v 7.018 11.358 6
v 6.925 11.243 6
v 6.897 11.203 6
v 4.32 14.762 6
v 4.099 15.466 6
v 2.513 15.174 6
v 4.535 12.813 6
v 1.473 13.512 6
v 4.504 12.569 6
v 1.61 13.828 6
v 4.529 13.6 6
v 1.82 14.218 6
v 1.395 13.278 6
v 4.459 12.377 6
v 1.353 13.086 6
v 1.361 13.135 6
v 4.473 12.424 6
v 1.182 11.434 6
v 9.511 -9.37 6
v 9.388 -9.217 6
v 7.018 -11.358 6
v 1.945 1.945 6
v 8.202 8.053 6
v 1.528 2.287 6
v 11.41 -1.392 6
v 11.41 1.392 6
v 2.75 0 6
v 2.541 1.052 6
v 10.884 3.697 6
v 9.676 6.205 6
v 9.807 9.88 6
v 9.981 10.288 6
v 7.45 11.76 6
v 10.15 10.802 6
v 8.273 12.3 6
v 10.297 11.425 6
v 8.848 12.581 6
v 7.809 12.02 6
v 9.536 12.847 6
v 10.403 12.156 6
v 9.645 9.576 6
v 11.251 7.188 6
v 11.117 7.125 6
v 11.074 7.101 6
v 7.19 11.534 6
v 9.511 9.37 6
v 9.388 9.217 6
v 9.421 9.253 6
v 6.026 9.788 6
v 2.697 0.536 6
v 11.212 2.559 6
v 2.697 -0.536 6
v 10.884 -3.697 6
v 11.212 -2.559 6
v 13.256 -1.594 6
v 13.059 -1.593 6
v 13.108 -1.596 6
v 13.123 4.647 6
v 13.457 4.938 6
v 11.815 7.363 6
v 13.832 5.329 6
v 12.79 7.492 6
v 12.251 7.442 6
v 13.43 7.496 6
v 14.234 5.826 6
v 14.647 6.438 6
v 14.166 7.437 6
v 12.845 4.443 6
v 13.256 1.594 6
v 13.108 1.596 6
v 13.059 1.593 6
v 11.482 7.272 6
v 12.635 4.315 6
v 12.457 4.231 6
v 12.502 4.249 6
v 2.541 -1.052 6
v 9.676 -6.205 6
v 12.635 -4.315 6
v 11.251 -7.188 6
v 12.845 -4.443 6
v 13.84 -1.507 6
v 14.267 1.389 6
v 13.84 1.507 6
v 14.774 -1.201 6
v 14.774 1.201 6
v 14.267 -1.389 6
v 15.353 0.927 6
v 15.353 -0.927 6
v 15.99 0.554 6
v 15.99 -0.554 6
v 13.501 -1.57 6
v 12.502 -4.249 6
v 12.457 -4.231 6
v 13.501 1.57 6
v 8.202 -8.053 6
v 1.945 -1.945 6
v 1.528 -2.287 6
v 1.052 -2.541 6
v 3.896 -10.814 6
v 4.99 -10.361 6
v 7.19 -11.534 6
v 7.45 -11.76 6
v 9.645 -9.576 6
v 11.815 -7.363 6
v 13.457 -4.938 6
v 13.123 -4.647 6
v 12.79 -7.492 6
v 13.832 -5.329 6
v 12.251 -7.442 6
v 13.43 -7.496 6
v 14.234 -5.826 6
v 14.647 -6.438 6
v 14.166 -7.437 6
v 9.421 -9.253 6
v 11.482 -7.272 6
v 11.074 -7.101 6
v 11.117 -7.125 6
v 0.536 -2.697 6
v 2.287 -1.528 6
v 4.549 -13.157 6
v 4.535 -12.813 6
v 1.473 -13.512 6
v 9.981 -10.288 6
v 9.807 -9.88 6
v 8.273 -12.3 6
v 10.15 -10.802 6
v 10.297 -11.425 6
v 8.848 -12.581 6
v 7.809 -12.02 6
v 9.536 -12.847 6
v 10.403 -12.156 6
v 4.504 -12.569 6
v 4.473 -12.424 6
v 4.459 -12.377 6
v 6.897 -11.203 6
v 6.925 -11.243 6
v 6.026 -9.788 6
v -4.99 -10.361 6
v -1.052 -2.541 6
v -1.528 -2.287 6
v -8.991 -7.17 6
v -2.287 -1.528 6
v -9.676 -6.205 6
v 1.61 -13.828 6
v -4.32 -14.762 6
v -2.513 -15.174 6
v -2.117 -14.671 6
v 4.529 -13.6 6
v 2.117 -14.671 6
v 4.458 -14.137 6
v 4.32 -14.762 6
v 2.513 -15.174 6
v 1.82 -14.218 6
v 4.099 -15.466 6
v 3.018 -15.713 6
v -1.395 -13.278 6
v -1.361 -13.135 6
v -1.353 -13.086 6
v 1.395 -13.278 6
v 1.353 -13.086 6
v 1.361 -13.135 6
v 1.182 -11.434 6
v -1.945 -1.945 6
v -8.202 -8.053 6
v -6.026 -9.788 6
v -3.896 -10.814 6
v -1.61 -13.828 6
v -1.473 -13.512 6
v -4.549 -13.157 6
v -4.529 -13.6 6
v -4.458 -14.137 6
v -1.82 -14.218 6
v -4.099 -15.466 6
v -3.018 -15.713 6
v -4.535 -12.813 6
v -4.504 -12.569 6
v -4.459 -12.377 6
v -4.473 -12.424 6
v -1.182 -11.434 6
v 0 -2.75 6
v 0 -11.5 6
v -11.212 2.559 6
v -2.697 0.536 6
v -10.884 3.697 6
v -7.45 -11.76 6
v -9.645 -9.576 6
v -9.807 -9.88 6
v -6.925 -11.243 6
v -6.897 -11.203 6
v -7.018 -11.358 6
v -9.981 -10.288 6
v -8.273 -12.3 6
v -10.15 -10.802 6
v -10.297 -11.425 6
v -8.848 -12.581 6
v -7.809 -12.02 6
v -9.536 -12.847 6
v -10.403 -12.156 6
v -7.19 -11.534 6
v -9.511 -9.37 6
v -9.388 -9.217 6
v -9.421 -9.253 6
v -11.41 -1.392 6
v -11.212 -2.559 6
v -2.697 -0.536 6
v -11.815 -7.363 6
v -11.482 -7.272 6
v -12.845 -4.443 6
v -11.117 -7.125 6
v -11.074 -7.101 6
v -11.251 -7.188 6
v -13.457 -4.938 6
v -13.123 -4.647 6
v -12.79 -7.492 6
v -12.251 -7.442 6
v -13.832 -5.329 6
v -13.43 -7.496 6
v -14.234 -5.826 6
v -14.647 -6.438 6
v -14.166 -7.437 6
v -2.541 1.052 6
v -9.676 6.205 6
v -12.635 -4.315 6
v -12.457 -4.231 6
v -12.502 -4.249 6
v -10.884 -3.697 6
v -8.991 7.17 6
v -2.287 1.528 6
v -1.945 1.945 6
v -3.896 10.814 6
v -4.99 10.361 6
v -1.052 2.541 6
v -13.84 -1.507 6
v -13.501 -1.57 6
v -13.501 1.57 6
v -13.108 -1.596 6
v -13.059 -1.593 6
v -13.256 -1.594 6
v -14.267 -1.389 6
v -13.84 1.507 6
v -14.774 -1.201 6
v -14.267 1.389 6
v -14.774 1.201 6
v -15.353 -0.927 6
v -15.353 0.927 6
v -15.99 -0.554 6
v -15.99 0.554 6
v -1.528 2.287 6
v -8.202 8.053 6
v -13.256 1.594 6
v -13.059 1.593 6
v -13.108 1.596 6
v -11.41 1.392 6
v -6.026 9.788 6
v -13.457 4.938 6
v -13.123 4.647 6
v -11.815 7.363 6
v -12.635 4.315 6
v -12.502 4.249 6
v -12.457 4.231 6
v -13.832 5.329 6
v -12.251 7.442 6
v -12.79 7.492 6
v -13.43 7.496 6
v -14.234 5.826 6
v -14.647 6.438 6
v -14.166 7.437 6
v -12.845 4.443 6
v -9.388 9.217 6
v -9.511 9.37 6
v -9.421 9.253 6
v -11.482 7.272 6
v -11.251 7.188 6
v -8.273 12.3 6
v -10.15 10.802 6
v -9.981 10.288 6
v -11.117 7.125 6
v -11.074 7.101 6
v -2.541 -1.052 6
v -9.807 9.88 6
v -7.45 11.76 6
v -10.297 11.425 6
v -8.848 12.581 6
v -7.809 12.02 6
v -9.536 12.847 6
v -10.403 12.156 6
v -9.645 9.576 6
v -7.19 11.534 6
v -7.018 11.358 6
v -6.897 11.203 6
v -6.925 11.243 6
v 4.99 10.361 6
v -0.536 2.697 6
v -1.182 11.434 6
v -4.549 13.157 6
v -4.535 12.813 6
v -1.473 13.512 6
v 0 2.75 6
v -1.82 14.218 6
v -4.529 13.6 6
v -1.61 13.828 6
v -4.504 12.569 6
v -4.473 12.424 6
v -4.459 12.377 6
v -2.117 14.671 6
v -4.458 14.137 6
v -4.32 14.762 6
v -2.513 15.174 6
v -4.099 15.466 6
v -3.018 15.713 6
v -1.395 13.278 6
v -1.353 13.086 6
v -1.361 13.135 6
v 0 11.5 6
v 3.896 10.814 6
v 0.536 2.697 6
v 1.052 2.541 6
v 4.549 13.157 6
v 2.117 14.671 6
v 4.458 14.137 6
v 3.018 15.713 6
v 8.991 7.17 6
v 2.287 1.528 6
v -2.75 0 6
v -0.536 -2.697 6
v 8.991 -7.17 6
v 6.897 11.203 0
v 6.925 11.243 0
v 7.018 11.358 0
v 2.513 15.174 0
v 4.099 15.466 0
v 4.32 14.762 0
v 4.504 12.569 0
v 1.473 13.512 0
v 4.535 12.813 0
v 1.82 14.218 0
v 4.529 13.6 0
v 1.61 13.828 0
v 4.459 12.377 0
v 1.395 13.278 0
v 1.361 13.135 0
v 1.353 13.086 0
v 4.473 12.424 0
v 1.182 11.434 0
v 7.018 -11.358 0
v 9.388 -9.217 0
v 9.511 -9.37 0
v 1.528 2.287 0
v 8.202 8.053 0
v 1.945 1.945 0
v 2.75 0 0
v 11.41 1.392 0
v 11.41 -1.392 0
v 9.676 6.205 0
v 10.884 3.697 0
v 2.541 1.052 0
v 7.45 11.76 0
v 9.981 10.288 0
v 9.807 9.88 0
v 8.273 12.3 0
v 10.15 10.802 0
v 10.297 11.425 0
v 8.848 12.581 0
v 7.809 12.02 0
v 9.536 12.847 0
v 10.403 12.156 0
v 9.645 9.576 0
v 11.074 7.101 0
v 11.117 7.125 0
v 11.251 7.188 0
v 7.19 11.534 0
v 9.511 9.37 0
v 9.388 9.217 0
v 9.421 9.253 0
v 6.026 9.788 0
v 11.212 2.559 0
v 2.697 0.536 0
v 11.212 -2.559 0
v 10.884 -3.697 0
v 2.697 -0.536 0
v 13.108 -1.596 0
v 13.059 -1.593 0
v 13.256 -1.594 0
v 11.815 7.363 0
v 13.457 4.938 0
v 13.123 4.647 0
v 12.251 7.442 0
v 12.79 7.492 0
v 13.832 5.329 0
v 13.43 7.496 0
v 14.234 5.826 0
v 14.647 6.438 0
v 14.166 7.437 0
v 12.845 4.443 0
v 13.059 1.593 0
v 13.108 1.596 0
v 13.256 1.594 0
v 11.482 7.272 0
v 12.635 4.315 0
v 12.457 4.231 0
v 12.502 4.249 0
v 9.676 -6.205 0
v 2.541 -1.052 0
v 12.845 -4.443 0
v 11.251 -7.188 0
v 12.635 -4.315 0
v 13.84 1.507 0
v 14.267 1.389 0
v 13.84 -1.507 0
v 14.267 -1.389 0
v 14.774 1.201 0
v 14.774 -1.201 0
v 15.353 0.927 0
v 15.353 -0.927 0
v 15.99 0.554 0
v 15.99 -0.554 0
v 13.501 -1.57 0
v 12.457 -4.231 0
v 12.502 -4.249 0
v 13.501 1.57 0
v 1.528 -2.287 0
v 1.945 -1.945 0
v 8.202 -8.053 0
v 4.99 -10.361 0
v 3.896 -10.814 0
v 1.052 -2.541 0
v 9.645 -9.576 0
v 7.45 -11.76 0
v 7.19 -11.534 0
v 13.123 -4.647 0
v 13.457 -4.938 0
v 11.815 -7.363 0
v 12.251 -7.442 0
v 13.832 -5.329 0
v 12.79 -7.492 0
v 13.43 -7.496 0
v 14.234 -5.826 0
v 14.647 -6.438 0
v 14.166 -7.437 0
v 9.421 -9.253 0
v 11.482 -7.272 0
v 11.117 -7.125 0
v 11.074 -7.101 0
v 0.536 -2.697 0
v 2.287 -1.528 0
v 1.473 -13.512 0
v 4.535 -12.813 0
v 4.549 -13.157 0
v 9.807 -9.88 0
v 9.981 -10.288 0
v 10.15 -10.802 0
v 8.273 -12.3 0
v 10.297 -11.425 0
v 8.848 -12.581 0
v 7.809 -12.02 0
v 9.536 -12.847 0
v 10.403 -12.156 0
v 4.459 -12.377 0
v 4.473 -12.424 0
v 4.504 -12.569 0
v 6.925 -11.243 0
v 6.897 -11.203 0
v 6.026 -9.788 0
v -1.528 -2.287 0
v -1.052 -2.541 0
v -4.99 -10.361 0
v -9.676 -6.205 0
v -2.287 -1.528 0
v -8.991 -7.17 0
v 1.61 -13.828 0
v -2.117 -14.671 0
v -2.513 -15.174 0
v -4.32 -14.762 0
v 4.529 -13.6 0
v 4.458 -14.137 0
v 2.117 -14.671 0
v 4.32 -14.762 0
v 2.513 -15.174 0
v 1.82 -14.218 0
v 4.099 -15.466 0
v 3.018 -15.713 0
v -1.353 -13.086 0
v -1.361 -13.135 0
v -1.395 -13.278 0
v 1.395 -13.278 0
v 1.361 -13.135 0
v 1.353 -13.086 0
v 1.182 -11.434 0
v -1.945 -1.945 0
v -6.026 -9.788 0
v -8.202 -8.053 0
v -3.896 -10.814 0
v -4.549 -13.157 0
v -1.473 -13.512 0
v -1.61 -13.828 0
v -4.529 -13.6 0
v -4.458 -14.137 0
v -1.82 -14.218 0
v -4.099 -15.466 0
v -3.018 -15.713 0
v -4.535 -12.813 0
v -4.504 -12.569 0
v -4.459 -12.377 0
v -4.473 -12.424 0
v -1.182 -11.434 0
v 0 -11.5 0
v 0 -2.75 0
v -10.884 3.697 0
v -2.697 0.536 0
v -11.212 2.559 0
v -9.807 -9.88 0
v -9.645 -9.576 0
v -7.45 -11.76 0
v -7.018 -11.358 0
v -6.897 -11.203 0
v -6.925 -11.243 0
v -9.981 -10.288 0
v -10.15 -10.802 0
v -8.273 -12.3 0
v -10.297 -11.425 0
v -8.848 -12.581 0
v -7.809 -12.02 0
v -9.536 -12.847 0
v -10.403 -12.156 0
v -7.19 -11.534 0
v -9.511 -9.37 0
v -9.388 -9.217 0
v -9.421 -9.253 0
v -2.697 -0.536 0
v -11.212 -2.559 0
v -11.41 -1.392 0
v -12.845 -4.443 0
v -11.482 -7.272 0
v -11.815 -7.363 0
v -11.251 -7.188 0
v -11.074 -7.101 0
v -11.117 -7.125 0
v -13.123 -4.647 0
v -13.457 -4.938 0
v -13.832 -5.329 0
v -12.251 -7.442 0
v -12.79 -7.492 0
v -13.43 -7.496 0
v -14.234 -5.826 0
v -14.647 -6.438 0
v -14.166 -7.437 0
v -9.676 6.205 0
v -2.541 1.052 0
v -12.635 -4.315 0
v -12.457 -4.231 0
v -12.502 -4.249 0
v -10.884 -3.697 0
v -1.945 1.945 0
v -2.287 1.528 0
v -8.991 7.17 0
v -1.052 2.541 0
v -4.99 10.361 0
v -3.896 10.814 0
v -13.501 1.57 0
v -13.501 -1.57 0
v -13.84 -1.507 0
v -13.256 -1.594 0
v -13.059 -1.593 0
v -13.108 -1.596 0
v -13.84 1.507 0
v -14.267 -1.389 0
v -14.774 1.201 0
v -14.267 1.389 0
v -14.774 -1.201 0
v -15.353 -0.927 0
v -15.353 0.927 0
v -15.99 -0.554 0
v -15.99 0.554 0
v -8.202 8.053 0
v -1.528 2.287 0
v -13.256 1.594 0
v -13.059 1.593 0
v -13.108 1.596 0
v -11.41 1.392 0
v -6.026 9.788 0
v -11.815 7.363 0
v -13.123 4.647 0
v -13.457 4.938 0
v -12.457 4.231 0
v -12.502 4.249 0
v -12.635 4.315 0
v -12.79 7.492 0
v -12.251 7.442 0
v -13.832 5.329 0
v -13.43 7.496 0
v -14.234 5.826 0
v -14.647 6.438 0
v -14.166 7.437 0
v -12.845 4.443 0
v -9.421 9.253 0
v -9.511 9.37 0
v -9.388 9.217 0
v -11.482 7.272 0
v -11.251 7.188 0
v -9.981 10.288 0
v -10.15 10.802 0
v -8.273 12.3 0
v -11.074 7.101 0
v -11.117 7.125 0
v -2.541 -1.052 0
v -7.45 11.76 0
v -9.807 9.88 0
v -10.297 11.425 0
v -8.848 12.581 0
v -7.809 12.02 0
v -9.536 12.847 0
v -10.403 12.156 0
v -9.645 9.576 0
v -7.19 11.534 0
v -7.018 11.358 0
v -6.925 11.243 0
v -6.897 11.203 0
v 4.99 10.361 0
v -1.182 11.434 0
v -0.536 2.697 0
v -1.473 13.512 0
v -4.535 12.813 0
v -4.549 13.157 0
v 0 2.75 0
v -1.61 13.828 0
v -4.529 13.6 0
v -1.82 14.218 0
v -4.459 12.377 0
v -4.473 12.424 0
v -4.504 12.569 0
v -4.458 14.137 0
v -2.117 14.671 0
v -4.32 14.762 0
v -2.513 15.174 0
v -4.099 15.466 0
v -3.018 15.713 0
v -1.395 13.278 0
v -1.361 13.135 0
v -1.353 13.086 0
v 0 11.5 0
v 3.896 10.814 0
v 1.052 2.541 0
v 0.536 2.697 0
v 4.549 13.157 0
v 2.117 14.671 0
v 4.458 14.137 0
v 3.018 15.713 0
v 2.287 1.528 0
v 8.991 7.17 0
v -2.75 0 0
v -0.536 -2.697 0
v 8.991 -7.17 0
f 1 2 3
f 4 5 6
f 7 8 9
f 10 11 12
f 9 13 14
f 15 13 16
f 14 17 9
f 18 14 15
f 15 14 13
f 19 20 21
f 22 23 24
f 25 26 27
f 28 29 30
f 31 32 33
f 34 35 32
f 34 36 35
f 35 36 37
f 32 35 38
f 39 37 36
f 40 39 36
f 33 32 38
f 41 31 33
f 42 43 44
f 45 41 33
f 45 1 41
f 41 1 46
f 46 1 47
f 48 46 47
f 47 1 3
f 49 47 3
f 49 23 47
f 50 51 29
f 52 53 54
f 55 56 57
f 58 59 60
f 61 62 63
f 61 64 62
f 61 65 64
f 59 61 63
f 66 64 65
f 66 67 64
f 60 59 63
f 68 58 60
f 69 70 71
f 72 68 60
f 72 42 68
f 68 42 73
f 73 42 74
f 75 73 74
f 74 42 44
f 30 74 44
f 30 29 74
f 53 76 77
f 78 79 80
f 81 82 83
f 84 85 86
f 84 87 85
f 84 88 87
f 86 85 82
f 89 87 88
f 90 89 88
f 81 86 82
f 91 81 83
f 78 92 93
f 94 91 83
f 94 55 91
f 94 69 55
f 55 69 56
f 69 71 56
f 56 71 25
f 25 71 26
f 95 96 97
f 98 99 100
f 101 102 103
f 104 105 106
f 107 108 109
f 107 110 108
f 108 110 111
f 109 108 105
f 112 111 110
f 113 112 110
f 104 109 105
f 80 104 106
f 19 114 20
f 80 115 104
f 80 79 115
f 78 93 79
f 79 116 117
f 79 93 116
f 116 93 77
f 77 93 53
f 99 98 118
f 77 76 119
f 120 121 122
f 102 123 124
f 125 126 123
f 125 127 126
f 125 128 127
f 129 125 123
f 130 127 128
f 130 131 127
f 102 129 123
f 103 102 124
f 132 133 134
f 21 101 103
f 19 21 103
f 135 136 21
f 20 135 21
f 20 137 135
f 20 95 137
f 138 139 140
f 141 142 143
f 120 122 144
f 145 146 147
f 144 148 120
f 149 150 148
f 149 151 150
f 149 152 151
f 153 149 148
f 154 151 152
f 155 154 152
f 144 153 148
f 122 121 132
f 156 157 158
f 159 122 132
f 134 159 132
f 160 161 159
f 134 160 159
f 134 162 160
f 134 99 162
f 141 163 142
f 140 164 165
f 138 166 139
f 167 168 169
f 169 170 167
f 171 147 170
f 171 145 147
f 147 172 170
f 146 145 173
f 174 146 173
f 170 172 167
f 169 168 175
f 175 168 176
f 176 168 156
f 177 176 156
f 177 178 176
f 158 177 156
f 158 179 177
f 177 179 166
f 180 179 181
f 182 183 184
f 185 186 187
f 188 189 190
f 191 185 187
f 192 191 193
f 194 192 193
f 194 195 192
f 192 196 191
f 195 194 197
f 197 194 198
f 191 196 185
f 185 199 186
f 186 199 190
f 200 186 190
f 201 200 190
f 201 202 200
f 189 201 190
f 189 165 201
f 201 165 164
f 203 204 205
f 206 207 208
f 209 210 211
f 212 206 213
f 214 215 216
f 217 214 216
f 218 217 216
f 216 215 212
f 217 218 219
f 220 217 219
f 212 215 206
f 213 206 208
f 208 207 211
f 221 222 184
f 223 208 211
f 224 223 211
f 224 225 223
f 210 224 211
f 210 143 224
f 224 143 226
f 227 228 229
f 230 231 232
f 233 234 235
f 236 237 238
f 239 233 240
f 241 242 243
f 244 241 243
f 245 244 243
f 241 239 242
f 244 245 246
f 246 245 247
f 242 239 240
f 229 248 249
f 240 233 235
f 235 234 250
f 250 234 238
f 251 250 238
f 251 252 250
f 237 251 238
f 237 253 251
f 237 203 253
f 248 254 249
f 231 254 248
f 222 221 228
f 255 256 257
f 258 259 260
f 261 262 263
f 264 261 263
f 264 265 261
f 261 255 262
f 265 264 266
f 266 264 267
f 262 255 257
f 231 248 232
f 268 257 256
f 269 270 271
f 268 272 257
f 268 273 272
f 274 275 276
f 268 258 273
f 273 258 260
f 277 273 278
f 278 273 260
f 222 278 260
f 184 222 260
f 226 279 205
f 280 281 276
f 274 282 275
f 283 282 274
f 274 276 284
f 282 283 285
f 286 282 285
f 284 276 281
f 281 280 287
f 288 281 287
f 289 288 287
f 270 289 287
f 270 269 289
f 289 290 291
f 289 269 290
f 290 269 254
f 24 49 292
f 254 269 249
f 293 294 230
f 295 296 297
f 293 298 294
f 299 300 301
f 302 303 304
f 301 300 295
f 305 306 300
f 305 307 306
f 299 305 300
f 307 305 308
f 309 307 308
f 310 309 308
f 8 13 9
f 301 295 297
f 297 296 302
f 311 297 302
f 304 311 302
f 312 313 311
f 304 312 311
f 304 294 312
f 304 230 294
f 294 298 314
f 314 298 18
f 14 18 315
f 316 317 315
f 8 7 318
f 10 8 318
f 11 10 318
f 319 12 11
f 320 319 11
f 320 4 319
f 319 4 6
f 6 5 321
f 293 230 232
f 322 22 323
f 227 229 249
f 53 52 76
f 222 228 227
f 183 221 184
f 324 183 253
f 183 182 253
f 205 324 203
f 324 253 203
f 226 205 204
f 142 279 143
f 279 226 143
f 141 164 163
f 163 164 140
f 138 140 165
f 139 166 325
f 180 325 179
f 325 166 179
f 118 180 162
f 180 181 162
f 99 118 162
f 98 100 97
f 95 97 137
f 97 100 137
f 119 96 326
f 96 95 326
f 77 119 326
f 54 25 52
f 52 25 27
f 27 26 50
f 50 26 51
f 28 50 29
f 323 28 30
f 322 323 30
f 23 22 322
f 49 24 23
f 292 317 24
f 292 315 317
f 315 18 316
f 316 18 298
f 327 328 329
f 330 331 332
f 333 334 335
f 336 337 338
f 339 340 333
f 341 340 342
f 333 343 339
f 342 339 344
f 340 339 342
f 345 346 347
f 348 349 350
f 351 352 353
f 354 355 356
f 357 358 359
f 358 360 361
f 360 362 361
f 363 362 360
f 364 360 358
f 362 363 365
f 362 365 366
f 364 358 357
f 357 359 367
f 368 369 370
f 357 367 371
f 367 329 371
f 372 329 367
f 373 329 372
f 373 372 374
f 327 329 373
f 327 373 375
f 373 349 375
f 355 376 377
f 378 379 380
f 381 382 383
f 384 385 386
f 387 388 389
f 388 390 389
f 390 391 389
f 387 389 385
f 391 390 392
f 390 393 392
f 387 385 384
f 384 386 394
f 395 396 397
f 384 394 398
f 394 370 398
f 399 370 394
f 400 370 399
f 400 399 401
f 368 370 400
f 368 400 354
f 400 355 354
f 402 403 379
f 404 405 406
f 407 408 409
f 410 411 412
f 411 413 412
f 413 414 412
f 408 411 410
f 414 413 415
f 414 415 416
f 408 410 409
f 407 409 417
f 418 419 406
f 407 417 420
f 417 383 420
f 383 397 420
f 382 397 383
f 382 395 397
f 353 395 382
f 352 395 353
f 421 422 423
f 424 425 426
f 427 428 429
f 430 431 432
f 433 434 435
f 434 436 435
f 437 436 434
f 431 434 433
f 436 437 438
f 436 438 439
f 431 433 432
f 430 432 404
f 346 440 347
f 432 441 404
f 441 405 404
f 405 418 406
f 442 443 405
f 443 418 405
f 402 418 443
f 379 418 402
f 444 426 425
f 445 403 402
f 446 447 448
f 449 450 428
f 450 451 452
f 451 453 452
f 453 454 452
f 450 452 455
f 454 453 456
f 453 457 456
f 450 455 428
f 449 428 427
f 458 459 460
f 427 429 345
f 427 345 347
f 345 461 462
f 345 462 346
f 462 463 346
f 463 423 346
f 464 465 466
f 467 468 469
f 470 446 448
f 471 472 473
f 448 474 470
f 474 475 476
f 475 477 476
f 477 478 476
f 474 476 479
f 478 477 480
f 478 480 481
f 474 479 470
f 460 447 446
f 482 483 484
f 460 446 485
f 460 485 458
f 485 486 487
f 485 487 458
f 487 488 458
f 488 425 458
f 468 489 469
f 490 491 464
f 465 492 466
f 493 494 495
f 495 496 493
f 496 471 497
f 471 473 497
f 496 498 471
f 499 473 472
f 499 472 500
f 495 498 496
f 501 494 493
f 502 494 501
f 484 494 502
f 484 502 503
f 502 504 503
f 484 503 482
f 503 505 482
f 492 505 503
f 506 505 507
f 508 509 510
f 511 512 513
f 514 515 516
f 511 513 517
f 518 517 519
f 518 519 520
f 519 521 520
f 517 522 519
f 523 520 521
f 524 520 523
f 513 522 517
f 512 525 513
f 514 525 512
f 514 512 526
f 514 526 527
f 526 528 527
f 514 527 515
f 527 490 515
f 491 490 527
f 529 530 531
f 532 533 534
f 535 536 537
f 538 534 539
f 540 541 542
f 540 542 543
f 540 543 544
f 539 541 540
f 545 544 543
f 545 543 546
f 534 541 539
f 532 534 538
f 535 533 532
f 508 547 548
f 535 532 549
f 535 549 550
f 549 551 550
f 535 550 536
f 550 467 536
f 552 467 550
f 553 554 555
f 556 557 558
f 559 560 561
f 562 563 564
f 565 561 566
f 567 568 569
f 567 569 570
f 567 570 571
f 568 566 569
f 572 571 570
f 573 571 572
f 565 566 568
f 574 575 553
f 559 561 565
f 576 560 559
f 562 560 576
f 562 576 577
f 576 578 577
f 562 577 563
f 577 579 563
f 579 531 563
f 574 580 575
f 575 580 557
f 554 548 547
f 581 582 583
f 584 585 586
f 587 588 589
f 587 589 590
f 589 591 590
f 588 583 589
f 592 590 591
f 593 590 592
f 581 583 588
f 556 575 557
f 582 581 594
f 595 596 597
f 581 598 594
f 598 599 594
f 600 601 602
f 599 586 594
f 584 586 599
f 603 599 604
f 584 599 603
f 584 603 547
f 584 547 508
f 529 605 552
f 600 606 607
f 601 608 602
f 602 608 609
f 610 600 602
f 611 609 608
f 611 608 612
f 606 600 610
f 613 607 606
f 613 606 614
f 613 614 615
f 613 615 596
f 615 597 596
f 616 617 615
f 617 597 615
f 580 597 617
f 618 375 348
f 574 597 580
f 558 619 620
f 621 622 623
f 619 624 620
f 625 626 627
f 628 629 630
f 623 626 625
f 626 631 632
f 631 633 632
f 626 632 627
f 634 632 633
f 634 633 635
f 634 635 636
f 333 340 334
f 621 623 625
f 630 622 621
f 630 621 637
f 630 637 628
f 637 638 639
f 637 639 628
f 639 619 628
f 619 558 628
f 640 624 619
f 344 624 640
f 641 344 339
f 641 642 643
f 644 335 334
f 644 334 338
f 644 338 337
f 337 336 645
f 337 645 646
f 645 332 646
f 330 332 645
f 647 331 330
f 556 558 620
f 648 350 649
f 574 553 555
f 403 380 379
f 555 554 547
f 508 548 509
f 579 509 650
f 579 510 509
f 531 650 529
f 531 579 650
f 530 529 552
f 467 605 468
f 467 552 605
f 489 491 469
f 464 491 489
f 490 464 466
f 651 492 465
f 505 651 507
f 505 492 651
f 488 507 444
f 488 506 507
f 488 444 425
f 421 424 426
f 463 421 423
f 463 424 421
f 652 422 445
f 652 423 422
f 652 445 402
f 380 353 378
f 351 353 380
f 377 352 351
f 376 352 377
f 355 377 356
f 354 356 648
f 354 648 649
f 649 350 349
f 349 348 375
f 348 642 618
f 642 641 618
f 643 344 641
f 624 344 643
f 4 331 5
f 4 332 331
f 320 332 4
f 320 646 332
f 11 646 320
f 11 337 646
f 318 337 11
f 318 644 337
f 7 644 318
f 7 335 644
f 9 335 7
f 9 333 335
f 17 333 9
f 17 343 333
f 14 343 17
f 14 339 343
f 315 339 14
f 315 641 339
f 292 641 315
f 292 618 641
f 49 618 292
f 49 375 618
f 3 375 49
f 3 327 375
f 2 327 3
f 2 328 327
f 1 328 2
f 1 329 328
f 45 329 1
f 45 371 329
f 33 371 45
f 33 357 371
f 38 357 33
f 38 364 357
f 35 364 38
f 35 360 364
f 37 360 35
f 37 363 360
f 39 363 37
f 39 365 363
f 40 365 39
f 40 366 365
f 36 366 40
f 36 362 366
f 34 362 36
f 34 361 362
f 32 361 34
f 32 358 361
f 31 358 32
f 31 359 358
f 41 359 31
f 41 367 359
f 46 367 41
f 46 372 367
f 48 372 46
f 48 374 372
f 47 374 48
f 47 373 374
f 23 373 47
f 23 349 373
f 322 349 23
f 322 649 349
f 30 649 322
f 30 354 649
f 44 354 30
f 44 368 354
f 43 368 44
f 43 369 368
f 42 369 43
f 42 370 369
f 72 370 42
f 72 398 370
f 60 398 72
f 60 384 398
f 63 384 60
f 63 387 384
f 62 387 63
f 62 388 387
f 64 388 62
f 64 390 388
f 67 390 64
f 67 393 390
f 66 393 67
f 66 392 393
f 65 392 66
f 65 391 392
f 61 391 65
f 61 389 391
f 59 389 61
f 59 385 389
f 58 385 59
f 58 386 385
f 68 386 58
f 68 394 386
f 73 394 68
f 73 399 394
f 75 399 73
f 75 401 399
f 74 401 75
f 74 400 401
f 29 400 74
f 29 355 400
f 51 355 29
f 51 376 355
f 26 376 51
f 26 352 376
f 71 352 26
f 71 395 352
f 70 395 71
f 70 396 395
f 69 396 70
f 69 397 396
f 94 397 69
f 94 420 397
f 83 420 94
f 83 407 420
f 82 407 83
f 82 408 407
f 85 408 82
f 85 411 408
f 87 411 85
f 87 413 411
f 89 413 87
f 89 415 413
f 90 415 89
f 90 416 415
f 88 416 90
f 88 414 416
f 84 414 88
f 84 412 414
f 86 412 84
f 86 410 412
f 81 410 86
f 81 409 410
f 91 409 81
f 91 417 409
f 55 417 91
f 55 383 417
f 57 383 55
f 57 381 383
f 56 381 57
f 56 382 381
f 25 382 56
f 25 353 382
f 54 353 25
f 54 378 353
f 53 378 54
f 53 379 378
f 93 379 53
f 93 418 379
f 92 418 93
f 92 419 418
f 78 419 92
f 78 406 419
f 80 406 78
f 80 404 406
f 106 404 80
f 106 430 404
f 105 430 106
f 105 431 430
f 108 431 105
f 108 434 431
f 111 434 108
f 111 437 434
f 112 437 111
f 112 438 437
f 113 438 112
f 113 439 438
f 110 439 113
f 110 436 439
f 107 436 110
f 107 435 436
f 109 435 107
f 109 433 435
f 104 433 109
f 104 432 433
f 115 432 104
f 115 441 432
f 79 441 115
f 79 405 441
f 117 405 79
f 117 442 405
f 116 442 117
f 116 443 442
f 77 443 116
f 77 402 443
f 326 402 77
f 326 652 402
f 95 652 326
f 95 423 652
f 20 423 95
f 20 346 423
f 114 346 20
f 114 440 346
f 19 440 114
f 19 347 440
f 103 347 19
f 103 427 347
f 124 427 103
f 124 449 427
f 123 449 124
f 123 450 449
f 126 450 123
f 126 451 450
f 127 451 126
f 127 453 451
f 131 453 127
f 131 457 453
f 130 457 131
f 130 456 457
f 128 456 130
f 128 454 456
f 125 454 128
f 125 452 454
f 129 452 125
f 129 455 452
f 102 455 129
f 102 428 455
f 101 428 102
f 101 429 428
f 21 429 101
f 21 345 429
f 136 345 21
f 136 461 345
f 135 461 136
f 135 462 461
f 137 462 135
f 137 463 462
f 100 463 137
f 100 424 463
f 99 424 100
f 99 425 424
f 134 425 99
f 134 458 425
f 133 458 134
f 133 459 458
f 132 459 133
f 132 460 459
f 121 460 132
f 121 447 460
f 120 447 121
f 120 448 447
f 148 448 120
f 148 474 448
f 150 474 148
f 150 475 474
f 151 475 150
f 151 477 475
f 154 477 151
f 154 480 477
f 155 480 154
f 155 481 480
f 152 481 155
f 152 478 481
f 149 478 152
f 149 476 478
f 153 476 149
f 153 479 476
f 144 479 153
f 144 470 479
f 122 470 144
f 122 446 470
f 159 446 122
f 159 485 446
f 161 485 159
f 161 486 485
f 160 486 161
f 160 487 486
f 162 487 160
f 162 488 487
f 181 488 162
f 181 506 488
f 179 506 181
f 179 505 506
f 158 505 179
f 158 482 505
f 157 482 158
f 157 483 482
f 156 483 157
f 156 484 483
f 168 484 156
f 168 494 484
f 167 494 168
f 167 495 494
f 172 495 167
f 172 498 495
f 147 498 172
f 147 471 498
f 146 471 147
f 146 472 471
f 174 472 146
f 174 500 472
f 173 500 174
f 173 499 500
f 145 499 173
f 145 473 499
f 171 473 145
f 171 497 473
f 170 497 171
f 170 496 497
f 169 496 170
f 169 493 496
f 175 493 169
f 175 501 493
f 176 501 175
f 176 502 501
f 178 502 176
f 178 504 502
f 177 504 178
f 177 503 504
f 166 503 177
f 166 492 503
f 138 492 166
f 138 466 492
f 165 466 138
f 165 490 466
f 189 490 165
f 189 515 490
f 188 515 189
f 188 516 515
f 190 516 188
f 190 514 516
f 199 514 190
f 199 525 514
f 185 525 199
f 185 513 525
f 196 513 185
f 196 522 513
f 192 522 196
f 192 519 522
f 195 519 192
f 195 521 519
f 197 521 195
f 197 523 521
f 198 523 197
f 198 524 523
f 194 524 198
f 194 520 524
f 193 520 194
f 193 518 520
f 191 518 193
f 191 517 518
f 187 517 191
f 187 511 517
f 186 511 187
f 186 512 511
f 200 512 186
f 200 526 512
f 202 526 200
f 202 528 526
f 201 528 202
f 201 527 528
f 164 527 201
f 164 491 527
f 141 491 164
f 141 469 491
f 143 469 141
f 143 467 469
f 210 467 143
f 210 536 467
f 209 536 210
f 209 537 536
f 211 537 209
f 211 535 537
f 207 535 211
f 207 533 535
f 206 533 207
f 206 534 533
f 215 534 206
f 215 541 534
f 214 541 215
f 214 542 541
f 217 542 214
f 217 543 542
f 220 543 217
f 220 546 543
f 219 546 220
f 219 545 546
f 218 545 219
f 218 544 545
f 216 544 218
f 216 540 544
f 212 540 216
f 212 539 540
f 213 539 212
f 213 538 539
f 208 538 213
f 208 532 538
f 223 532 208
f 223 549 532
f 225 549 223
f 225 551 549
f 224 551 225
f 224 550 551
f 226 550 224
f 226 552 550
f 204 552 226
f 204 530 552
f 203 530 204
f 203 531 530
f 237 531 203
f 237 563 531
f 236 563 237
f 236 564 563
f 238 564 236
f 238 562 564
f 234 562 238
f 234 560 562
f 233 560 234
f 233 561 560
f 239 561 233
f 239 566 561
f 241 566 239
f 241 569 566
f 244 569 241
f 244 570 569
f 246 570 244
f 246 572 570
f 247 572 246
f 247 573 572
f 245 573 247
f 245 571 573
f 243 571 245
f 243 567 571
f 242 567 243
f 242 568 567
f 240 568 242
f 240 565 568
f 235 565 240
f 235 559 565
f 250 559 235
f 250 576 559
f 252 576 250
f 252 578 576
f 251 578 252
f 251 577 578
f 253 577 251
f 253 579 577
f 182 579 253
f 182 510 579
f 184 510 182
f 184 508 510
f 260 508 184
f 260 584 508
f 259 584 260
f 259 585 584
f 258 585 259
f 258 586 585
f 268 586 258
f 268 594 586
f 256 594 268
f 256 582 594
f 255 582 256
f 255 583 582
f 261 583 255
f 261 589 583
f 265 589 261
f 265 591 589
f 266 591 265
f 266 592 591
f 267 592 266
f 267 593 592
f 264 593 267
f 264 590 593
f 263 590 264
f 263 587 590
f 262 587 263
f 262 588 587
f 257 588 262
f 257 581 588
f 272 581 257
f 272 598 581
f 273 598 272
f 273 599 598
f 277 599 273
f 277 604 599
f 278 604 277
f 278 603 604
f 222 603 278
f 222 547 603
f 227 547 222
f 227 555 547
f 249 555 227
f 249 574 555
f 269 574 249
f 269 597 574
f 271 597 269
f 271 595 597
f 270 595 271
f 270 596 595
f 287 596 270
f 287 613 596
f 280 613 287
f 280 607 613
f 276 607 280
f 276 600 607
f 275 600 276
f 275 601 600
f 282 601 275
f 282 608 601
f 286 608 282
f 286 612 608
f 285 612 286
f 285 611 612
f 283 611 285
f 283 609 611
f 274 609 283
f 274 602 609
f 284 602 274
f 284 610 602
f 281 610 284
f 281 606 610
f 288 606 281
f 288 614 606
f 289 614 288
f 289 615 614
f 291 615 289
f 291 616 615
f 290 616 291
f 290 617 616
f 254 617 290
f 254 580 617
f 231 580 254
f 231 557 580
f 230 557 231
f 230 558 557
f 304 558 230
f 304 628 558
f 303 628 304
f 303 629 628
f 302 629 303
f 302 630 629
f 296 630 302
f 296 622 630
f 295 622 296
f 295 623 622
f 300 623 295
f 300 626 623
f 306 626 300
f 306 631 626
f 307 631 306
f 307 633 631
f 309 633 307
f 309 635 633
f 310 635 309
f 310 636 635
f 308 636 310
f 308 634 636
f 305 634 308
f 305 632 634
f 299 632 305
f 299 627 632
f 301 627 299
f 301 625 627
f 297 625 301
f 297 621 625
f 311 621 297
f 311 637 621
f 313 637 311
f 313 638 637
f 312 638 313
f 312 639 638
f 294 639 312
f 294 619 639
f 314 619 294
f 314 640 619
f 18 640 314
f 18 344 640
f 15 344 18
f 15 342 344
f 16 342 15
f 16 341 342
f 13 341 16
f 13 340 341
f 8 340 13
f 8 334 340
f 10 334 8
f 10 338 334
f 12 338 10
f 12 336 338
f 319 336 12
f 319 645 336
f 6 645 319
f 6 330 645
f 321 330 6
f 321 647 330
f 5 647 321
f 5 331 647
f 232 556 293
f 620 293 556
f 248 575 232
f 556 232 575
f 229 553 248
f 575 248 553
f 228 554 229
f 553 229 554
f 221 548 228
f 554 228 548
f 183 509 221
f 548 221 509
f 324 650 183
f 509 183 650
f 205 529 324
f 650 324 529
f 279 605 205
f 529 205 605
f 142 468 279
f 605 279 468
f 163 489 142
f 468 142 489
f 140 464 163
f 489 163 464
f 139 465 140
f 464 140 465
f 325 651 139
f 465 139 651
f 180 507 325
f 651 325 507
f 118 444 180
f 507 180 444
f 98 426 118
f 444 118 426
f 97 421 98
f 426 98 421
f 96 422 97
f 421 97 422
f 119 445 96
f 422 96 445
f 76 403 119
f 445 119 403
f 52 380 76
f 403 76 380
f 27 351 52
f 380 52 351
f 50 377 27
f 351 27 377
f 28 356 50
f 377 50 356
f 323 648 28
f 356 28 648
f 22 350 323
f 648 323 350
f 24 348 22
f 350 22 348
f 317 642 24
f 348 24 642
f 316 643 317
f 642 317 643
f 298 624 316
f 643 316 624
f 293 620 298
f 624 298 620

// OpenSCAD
include <../lib/meshtastic-drybag-node-lib.scad>;
$fn = 40;
idler_print();
